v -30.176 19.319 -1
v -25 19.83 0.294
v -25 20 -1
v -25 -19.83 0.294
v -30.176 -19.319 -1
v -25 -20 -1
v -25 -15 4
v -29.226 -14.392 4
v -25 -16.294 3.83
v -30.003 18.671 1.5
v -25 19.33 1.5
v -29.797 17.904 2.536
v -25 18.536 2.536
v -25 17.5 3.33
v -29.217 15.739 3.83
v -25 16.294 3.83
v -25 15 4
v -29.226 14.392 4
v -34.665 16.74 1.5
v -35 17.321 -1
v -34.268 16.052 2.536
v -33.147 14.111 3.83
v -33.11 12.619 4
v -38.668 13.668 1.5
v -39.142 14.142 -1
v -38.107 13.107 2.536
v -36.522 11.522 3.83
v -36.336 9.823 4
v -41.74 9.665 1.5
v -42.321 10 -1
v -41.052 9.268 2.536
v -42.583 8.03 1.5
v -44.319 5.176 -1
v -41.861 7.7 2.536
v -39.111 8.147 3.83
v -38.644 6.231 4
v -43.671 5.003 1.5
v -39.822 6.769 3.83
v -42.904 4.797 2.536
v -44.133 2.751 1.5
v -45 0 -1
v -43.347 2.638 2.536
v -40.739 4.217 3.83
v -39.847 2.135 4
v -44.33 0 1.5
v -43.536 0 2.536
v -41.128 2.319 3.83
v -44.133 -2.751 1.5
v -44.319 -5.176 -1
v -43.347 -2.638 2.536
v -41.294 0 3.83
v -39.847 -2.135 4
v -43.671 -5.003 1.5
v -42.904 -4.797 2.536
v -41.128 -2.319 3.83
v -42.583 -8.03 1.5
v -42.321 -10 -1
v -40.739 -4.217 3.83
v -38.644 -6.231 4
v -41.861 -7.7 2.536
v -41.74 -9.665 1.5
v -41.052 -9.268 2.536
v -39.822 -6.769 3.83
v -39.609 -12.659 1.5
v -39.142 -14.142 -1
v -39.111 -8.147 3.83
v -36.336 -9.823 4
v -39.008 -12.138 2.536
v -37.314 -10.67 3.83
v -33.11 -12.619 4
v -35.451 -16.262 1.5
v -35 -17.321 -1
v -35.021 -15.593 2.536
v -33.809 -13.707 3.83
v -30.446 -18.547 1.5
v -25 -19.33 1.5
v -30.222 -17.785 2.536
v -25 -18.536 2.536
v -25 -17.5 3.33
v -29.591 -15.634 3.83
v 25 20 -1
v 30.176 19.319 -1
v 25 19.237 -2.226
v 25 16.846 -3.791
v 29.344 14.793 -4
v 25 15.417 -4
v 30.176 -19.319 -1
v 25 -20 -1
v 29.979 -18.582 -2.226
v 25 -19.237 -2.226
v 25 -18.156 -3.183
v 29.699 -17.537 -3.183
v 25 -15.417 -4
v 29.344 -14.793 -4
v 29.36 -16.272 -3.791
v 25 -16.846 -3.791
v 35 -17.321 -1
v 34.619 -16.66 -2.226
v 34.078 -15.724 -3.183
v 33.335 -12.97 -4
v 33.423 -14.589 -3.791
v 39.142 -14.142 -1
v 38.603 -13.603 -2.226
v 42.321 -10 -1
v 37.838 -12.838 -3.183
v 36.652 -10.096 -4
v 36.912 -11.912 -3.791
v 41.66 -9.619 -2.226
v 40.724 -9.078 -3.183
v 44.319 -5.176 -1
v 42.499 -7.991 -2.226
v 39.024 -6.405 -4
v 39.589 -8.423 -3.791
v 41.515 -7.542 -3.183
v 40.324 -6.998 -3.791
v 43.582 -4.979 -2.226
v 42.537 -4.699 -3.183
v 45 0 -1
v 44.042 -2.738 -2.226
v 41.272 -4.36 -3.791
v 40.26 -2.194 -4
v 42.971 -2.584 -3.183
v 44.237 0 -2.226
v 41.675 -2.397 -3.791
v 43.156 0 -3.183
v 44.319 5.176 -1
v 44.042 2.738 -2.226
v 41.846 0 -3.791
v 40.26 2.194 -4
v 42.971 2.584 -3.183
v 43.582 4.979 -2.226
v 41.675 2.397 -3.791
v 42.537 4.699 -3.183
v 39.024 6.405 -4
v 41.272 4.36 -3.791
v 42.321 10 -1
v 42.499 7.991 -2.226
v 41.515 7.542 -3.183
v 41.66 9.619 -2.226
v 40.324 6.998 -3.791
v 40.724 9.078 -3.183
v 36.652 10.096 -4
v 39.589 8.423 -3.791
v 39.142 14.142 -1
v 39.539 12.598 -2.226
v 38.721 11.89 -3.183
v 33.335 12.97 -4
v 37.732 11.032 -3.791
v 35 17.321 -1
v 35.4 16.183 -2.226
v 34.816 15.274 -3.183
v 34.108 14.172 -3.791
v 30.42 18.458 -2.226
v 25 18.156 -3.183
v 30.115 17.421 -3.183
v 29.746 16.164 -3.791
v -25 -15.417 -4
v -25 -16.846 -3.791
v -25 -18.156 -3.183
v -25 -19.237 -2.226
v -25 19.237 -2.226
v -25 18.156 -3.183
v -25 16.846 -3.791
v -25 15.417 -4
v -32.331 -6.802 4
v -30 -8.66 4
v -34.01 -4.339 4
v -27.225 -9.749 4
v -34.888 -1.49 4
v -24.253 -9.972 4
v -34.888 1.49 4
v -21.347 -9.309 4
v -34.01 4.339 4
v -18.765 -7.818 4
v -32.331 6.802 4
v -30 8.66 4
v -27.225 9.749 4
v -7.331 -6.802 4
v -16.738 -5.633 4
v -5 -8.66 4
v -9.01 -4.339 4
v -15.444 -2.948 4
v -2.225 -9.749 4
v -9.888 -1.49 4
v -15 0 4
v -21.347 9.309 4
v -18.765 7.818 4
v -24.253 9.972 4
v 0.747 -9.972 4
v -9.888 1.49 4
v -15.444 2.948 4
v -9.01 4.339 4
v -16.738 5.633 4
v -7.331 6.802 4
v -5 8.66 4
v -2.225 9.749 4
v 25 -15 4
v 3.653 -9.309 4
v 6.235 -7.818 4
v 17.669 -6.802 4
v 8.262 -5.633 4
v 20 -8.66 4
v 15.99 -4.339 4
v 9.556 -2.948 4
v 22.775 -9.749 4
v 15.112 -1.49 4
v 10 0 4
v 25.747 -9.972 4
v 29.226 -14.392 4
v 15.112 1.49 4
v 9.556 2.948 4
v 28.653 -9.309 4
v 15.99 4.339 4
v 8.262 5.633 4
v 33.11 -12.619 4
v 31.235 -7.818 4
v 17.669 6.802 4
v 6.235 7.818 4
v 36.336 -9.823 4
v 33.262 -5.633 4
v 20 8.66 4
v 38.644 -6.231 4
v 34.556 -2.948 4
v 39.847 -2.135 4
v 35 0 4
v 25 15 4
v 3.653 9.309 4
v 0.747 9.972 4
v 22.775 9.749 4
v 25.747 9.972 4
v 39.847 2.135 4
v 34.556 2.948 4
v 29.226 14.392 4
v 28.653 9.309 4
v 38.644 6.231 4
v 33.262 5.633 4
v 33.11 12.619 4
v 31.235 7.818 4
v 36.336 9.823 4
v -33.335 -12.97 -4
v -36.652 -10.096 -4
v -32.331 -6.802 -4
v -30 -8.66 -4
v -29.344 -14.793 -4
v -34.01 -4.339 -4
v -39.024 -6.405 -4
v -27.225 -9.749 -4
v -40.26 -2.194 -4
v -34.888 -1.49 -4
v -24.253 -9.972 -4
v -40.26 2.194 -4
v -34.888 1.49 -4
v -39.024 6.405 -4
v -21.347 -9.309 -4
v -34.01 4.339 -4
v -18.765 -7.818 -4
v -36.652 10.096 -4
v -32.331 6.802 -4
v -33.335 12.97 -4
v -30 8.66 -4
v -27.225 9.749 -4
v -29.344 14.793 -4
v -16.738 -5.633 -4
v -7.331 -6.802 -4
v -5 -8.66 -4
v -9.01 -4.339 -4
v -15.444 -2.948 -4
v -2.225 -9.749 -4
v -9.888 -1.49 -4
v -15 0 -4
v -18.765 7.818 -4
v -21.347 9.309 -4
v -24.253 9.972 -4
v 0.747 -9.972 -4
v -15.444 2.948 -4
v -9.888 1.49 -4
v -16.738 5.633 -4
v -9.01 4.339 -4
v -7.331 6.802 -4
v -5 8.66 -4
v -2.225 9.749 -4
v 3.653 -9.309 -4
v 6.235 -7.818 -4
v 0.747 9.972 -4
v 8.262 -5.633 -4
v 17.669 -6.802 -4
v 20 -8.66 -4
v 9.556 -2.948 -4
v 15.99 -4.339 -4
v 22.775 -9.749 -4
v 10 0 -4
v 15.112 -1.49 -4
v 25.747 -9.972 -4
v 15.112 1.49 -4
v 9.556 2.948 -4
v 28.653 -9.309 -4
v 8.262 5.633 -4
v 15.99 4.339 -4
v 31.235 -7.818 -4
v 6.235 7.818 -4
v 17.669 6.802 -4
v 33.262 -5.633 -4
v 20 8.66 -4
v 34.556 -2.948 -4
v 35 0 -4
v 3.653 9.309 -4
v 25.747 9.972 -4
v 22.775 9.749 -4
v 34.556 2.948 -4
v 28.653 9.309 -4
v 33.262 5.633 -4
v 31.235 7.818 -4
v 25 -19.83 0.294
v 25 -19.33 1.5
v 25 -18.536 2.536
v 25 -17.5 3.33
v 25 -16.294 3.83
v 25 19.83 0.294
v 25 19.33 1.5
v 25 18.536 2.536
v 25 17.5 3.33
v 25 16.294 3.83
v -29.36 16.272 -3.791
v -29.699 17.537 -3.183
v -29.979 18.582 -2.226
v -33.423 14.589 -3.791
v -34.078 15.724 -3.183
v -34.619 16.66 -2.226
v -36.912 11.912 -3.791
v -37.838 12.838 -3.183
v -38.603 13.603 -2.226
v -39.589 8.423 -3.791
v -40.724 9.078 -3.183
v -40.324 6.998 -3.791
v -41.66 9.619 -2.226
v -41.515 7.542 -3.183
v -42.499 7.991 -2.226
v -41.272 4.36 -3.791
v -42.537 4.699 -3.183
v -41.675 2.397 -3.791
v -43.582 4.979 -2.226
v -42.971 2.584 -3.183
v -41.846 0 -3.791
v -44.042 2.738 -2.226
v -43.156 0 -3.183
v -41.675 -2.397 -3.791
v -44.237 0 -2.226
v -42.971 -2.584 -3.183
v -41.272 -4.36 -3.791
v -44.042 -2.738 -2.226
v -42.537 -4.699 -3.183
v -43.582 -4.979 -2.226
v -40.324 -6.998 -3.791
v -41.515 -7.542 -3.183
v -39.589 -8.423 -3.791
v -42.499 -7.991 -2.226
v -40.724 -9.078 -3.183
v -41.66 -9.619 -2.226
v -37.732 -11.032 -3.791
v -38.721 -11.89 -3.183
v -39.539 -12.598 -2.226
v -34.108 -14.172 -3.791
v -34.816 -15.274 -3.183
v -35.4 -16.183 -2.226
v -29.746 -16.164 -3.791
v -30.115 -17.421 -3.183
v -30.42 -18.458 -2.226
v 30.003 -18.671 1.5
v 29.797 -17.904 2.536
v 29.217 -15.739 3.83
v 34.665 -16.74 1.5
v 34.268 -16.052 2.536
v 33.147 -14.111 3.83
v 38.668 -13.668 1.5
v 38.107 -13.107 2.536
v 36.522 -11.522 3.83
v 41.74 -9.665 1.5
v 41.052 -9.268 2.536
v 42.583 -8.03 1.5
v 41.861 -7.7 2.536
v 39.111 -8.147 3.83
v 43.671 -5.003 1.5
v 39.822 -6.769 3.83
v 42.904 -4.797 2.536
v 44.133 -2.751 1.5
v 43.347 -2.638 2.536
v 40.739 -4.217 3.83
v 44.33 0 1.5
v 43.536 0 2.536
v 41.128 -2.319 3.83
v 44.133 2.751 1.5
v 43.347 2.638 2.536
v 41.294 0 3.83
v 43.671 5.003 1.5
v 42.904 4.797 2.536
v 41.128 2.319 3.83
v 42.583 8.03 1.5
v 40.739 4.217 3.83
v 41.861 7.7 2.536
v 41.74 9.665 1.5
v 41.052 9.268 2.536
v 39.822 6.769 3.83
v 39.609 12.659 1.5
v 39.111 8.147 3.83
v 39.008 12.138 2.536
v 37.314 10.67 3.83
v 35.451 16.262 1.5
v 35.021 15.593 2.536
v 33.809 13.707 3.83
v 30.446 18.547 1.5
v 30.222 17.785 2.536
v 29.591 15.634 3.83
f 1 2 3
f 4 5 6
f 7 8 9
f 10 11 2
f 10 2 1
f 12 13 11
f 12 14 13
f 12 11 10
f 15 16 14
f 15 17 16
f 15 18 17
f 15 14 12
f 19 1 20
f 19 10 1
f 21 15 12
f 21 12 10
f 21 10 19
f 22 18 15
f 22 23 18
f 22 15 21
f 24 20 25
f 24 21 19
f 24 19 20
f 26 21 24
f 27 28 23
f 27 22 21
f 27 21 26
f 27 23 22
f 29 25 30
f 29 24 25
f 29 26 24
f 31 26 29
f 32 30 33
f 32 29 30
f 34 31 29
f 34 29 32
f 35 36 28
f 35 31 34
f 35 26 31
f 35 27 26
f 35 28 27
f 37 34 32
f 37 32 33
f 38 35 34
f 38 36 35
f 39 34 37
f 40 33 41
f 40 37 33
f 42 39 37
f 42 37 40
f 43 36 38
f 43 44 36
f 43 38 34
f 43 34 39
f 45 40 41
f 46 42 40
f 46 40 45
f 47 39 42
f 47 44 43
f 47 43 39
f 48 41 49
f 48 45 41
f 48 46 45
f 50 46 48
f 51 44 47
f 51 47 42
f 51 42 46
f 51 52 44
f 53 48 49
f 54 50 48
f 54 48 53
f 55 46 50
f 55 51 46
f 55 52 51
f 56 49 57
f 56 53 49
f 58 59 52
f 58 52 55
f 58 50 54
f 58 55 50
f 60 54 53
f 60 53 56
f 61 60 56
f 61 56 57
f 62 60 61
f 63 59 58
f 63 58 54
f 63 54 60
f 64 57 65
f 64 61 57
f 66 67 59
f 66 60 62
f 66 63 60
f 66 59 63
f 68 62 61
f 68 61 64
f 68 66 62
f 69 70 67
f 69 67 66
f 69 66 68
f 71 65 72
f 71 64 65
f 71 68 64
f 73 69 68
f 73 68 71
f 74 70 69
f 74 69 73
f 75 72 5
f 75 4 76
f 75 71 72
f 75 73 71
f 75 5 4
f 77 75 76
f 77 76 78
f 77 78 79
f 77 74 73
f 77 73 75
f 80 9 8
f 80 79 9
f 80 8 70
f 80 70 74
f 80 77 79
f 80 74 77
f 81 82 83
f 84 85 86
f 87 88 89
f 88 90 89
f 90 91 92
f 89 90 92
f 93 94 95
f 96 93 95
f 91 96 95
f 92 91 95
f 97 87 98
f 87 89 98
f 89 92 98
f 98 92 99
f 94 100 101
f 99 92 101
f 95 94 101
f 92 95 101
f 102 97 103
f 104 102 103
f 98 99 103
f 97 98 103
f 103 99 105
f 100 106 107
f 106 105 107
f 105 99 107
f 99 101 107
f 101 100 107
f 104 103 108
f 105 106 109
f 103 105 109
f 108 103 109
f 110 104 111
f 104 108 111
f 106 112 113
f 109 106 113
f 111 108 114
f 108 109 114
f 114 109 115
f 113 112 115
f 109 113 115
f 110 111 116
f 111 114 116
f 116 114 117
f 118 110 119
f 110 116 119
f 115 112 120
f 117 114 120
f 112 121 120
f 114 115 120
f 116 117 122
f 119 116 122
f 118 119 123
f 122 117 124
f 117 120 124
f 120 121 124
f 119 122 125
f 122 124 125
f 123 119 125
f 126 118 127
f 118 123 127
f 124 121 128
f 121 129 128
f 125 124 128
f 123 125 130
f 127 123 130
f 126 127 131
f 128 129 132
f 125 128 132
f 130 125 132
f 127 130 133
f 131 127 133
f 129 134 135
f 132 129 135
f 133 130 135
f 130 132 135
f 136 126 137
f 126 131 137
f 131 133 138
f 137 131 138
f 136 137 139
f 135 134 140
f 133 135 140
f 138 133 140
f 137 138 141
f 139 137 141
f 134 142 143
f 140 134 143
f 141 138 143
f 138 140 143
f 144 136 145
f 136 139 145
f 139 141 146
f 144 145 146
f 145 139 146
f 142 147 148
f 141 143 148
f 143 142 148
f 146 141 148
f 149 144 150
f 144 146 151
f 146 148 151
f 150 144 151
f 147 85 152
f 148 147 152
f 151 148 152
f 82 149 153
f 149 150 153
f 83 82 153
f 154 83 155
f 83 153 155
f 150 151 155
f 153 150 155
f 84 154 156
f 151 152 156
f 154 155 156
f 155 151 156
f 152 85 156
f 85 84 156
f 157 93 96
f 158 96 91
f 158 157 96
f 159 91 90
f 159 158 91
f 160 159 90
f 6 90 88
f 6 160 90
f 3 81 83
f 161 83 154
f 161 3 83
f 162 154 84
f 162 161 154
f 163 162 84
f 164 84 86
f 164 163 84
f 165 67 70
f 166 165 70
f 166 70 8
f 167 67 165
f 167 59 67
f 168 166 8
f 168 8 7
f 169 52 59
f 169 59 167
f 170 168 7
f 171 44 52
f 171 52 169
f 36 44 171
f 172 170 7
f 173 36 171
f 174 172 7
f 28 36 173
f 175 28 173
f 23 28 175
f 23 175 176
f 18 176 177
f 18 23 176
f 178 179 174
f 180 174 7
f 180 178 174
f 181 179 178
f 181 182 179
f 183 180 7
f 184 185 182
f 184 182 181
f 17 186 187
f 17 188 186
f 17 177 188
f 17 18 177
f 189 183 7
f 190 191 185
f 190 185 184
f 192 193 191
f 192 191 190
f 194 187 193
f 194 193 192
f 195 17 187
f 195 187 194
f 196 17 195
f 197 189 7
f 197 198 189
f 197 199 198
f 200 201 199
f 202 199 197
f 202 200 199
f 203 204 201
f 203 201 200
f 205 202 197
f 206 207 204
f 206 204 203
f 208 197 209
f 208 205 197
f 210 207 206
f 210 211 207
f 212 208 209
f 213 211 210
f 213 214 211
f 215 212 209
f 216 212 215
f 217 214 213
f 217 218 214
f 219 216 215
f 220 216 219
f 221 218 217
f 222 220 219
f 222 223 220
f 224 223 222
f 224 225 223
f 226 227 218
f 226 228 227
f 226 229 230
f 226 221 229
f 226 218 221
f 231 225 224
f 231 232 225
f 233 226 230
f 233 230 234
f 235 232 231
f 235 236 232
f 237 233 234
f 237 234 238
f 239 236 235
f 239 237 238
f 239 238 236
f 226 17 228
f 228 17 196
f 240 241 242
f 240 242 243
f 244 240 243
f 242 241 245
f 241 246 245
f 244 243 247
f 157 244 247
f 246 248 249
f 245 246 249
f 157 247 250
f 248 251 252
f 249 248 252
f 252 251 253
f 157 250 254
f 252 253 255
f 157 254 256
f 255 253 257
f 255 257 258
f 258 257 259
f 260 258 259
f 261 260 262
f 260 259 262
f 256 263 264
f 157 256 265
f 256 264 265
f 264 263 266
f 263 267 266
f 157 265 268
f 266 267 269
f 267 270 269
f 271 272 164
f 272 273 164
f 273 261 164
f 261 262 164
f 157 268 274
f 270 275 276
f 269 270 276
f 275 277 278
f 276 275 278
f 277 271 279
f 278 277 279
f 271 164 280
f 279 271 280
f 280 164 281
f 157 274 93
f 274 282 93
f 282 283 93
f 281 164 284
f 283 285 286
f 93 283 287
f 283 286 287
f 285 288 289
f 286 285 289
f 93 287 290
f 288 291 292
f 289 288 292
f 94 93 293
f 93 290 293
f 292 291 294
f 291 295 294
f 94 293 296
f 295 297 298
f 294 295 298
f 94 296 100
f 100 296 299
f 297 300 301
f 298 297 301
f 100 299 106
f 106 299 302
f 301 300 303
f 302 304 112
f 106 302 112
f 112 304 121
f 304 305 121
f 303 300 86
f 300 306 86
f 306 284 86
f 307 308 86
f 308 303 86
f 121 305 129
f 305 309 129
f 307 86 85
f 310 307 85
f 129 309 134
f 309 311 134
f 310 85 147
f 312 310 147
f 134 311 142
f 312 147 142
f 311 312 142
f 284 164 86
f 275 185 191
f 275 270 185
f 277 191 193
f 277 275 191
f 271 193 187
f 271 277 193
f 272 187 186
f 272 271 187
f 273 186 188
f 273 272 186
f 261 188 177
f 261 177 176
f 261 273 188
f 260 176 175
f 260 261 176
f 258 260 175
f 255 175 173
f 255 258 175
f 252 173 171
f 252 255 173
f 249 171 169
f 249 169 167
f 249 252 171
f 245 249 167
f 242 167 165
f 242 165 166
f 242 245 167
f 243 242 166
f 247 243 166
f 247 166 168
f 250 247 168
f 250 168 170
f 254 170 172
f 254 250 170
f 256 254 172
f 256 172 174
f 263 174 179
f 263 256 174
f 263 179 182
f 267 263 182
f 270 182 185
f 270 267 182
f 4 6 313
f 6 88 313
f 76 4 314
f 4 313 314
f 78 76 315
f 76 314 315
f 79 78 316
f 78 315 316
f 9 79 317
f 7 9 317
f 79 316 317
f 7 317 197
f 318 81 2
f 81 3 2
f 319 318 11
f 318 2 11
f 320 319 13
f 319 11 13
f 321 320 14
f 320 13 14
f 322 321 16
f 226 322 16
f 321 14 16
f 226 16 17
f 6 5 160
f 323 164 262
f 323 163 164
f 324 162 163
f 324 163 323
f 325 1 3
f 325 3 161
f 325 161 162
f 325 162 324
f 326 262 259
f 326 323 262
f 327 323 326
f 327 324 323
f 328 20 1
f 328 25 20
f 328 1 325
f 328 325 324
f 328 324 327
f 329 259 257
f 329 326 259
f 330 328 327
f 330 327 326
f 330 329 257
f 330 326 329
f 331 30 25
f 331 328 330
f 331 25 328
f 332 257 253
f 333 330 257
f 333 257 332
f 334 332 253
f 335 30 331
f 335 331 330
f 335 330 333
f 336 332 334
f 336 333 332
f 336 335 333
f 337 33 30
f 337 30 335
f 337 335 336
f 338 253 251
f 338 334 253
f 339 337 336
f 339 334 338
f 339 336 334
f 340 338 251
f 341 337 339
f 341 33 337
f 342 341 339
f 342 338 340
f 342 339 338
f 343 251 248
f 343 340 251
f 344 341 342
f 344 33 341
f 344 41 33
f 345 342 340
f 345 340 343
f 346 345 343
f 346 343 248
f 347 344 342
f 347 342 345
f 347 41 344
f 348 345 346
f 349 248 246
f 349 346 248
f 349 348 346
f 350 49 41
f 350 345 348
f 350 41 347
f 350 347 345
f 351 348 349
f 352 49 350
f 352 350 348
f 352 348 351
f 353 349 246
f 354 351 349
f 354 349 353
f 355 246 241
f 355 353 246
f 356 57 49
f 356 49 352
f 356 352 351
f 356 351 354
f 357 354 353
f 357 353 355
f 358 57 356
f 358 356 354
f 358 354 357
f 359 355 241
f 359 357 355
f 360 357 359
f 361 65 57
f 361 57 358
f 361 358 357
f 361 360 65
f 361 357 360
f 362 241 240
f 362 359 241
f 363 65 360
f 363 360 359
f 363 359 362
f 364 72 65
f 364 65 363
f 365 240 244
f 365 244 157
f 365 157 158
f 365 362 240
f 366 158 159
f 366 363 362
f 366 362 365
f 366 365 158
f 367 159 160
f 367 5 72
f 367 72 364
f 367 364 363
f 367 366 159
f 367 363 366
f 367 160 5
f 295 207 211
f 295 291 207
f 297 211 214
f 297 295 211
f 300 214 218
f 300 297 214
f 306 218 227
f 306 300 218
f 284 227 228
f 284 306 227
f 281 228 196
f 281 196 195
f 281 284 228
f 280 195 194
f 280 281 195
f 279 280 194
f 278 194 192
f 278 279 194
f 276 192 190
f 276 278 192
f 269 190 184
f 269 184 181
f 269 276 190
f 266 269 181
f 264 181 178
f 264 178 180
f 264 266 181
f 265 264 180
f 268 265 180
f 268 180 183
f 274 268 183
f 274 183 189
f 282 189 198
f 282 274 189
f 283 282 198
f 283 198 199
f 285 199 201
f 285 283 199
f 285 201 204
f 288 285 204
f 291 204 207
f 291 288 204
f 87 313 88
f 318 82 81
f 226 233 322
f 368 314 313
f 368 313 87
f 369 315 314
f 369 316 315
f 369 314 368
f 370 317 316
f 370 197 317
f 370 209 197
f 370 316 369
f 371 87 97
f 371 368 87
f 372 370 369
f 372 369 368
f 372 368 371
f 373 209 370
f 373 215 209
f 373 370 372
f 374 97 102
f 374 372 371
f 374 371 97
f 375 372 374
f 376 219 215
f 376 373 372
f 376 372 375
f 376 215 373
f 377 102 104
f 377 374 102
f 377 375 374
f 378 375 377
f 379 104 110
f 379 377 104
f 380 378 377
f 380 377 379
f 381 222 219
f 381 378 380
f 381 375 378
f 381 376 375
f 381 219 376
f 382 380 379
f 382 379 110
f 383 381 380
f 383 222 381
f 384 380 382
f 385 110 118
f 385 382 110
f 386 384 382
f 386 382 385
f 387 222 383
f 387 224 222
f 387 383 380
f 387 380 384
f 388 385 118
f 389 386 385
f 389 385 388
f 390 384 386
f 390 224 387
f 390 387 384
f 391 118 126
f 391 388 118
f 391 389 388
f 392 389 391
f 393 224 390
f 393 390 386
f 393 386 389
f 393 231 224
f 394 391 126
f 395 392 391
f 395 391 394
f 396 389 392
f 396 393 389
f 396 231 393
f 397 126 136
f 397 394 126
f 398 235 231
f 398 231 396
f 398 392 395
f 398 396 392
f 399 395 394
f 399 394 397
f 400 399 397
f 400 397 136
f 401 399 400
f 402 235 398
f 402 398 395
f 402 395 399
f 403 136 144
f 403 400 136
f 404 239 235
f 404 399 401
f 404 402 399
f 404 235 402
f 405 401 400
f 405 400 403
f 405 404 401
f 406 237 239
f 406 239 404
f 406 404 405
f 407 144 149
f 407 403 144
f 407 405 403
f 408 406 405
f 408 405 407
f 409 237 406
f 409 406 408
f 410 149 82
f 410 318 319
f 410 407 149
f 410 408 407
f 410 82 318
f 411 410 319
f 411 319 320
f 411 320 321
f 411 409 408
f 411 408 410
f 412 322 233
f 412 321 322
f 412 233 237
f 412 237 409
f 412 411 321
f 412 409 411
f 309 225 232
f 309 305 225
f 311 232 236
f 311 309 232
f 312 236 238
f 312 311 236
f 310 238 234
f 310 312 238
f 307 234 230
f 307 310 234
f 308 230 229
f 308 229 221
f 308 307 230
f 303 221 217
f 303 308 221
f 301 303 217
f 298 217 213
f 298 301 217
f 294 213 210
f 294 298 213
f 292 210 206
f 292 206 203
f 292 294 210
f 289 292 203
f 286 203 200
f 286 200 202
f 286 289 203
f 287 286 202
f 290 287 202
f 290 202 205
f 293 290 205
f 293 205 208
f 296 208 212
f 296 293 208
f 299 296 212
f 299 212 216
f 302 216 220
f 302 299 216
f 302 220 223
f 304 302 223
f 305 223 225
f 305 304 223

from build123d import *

# Parameters (mm, degrees)
F0_R        = 10
F1_DEPTH    = 4
F2_R        = 5
F3_T1_DEPTH = 50
F3_T4_ANGLE = 180
F3_T6_ANGLE = 180


# Not quite as in the source:
# - a fillet or chamfer that OpenCascade refuses, or shapes differently, is made with other operations: its cross-section is extruded or revolved along the edge and cut away or added


with BuildPart() as f1:
    # F0 (on Top) → F1 (new body, symmetric)
    with BuildSketch(Plane.XY):
        with BuildLine():
            Line((25, 20), (-25, 20))
            ThreePointArc((-25, 20), (-45, 0), (-25, -20))
            Line((-25, -20), (25, -20))
            ThreePointArc((25, -20), (45, 0), (25, 20))
        make_face()
        with Locations((-25, 0)):
            Circle(F0_R, mode=Mode.SUBTRACT)
        Circle(F0_R, mode=Mode.SUBTRACT)
        with Locations((25, 0)):
            Circle(F0_R, mode=Mode.SUBTRACT)
    extrude(amount=F1_DEPTH, both=True)

    # F2
    f2_edges = [f1.edges().sort_by_distance(p)[0] for p in [
        (0, 20, 4),
        (-45, 0, 4),
        (0, -20, 4),
        (45, 0, 4),
    ]]
    fillet(f2_edges, radius=F2_R)

    # F3: fillet of radius 5 on 4 edges, made by hand

    # F3_s2 → F3_t1 (cut)
    with BuildSketch(Plane.YZ.offset(-25)):
        with BuildLine():
            ThreePointArc((-15.417424305, -4), (-18.1560370926, -3.1833001327), (-20, -1))
            Line((-20, -1), (-20, -4))
            Line((-20, -4), (-15.417424305, -4))
        make_face()
        with BuildLine():
            ThreePointArc((20, -1), (18.1560370926, -3.1833001327), (15.417424305, -4))
            Line((15.417424305, -4), (20, -4))
            Line((20, -4), (20, -1))
        make_face()
    extrude(amount=F3_T1_DEPTH, mode=Mode.SUBTRACT)

    # F3_s3 → F3_t4 (revolve, cut)
    with BuildSketch(Plane.YZ.offset(25)):
        with BuildLine():
            ThreePointArc((-20, -1), (-18.1560370926, -3.1833001327), (-15.417424305, -4))
            Line((-15.417424305, -4), (-20, -4))
            Line((-20, -4), (-20, -1))
        make_face()
    revolve(axis=Axis((25, 0, -4), (0, 0, 1)), revolution_arc=F3_T4_ANGLE, mode=Mode.SUBTRACT)

    # F3_s5 → F3_t6 (revolve, cut)
    with BuildSketch(Plane.YZ.offset(-25)):
        with BuildLine():
            ThreePointArc((15.417424305, -4), (18.1560370926, -3.1833001327), (20, -1))
            Line((20, -1), (20, -4))
            Line((20, -4), (15.417424305, -4))
        make_face()
    revolve(axis=Axis((-25, 0, -4), (0, 0, 1)), revolution_arc=F3_T6_ANGLE, mode=Mode.SUBTRACT)


solid = f1.part
